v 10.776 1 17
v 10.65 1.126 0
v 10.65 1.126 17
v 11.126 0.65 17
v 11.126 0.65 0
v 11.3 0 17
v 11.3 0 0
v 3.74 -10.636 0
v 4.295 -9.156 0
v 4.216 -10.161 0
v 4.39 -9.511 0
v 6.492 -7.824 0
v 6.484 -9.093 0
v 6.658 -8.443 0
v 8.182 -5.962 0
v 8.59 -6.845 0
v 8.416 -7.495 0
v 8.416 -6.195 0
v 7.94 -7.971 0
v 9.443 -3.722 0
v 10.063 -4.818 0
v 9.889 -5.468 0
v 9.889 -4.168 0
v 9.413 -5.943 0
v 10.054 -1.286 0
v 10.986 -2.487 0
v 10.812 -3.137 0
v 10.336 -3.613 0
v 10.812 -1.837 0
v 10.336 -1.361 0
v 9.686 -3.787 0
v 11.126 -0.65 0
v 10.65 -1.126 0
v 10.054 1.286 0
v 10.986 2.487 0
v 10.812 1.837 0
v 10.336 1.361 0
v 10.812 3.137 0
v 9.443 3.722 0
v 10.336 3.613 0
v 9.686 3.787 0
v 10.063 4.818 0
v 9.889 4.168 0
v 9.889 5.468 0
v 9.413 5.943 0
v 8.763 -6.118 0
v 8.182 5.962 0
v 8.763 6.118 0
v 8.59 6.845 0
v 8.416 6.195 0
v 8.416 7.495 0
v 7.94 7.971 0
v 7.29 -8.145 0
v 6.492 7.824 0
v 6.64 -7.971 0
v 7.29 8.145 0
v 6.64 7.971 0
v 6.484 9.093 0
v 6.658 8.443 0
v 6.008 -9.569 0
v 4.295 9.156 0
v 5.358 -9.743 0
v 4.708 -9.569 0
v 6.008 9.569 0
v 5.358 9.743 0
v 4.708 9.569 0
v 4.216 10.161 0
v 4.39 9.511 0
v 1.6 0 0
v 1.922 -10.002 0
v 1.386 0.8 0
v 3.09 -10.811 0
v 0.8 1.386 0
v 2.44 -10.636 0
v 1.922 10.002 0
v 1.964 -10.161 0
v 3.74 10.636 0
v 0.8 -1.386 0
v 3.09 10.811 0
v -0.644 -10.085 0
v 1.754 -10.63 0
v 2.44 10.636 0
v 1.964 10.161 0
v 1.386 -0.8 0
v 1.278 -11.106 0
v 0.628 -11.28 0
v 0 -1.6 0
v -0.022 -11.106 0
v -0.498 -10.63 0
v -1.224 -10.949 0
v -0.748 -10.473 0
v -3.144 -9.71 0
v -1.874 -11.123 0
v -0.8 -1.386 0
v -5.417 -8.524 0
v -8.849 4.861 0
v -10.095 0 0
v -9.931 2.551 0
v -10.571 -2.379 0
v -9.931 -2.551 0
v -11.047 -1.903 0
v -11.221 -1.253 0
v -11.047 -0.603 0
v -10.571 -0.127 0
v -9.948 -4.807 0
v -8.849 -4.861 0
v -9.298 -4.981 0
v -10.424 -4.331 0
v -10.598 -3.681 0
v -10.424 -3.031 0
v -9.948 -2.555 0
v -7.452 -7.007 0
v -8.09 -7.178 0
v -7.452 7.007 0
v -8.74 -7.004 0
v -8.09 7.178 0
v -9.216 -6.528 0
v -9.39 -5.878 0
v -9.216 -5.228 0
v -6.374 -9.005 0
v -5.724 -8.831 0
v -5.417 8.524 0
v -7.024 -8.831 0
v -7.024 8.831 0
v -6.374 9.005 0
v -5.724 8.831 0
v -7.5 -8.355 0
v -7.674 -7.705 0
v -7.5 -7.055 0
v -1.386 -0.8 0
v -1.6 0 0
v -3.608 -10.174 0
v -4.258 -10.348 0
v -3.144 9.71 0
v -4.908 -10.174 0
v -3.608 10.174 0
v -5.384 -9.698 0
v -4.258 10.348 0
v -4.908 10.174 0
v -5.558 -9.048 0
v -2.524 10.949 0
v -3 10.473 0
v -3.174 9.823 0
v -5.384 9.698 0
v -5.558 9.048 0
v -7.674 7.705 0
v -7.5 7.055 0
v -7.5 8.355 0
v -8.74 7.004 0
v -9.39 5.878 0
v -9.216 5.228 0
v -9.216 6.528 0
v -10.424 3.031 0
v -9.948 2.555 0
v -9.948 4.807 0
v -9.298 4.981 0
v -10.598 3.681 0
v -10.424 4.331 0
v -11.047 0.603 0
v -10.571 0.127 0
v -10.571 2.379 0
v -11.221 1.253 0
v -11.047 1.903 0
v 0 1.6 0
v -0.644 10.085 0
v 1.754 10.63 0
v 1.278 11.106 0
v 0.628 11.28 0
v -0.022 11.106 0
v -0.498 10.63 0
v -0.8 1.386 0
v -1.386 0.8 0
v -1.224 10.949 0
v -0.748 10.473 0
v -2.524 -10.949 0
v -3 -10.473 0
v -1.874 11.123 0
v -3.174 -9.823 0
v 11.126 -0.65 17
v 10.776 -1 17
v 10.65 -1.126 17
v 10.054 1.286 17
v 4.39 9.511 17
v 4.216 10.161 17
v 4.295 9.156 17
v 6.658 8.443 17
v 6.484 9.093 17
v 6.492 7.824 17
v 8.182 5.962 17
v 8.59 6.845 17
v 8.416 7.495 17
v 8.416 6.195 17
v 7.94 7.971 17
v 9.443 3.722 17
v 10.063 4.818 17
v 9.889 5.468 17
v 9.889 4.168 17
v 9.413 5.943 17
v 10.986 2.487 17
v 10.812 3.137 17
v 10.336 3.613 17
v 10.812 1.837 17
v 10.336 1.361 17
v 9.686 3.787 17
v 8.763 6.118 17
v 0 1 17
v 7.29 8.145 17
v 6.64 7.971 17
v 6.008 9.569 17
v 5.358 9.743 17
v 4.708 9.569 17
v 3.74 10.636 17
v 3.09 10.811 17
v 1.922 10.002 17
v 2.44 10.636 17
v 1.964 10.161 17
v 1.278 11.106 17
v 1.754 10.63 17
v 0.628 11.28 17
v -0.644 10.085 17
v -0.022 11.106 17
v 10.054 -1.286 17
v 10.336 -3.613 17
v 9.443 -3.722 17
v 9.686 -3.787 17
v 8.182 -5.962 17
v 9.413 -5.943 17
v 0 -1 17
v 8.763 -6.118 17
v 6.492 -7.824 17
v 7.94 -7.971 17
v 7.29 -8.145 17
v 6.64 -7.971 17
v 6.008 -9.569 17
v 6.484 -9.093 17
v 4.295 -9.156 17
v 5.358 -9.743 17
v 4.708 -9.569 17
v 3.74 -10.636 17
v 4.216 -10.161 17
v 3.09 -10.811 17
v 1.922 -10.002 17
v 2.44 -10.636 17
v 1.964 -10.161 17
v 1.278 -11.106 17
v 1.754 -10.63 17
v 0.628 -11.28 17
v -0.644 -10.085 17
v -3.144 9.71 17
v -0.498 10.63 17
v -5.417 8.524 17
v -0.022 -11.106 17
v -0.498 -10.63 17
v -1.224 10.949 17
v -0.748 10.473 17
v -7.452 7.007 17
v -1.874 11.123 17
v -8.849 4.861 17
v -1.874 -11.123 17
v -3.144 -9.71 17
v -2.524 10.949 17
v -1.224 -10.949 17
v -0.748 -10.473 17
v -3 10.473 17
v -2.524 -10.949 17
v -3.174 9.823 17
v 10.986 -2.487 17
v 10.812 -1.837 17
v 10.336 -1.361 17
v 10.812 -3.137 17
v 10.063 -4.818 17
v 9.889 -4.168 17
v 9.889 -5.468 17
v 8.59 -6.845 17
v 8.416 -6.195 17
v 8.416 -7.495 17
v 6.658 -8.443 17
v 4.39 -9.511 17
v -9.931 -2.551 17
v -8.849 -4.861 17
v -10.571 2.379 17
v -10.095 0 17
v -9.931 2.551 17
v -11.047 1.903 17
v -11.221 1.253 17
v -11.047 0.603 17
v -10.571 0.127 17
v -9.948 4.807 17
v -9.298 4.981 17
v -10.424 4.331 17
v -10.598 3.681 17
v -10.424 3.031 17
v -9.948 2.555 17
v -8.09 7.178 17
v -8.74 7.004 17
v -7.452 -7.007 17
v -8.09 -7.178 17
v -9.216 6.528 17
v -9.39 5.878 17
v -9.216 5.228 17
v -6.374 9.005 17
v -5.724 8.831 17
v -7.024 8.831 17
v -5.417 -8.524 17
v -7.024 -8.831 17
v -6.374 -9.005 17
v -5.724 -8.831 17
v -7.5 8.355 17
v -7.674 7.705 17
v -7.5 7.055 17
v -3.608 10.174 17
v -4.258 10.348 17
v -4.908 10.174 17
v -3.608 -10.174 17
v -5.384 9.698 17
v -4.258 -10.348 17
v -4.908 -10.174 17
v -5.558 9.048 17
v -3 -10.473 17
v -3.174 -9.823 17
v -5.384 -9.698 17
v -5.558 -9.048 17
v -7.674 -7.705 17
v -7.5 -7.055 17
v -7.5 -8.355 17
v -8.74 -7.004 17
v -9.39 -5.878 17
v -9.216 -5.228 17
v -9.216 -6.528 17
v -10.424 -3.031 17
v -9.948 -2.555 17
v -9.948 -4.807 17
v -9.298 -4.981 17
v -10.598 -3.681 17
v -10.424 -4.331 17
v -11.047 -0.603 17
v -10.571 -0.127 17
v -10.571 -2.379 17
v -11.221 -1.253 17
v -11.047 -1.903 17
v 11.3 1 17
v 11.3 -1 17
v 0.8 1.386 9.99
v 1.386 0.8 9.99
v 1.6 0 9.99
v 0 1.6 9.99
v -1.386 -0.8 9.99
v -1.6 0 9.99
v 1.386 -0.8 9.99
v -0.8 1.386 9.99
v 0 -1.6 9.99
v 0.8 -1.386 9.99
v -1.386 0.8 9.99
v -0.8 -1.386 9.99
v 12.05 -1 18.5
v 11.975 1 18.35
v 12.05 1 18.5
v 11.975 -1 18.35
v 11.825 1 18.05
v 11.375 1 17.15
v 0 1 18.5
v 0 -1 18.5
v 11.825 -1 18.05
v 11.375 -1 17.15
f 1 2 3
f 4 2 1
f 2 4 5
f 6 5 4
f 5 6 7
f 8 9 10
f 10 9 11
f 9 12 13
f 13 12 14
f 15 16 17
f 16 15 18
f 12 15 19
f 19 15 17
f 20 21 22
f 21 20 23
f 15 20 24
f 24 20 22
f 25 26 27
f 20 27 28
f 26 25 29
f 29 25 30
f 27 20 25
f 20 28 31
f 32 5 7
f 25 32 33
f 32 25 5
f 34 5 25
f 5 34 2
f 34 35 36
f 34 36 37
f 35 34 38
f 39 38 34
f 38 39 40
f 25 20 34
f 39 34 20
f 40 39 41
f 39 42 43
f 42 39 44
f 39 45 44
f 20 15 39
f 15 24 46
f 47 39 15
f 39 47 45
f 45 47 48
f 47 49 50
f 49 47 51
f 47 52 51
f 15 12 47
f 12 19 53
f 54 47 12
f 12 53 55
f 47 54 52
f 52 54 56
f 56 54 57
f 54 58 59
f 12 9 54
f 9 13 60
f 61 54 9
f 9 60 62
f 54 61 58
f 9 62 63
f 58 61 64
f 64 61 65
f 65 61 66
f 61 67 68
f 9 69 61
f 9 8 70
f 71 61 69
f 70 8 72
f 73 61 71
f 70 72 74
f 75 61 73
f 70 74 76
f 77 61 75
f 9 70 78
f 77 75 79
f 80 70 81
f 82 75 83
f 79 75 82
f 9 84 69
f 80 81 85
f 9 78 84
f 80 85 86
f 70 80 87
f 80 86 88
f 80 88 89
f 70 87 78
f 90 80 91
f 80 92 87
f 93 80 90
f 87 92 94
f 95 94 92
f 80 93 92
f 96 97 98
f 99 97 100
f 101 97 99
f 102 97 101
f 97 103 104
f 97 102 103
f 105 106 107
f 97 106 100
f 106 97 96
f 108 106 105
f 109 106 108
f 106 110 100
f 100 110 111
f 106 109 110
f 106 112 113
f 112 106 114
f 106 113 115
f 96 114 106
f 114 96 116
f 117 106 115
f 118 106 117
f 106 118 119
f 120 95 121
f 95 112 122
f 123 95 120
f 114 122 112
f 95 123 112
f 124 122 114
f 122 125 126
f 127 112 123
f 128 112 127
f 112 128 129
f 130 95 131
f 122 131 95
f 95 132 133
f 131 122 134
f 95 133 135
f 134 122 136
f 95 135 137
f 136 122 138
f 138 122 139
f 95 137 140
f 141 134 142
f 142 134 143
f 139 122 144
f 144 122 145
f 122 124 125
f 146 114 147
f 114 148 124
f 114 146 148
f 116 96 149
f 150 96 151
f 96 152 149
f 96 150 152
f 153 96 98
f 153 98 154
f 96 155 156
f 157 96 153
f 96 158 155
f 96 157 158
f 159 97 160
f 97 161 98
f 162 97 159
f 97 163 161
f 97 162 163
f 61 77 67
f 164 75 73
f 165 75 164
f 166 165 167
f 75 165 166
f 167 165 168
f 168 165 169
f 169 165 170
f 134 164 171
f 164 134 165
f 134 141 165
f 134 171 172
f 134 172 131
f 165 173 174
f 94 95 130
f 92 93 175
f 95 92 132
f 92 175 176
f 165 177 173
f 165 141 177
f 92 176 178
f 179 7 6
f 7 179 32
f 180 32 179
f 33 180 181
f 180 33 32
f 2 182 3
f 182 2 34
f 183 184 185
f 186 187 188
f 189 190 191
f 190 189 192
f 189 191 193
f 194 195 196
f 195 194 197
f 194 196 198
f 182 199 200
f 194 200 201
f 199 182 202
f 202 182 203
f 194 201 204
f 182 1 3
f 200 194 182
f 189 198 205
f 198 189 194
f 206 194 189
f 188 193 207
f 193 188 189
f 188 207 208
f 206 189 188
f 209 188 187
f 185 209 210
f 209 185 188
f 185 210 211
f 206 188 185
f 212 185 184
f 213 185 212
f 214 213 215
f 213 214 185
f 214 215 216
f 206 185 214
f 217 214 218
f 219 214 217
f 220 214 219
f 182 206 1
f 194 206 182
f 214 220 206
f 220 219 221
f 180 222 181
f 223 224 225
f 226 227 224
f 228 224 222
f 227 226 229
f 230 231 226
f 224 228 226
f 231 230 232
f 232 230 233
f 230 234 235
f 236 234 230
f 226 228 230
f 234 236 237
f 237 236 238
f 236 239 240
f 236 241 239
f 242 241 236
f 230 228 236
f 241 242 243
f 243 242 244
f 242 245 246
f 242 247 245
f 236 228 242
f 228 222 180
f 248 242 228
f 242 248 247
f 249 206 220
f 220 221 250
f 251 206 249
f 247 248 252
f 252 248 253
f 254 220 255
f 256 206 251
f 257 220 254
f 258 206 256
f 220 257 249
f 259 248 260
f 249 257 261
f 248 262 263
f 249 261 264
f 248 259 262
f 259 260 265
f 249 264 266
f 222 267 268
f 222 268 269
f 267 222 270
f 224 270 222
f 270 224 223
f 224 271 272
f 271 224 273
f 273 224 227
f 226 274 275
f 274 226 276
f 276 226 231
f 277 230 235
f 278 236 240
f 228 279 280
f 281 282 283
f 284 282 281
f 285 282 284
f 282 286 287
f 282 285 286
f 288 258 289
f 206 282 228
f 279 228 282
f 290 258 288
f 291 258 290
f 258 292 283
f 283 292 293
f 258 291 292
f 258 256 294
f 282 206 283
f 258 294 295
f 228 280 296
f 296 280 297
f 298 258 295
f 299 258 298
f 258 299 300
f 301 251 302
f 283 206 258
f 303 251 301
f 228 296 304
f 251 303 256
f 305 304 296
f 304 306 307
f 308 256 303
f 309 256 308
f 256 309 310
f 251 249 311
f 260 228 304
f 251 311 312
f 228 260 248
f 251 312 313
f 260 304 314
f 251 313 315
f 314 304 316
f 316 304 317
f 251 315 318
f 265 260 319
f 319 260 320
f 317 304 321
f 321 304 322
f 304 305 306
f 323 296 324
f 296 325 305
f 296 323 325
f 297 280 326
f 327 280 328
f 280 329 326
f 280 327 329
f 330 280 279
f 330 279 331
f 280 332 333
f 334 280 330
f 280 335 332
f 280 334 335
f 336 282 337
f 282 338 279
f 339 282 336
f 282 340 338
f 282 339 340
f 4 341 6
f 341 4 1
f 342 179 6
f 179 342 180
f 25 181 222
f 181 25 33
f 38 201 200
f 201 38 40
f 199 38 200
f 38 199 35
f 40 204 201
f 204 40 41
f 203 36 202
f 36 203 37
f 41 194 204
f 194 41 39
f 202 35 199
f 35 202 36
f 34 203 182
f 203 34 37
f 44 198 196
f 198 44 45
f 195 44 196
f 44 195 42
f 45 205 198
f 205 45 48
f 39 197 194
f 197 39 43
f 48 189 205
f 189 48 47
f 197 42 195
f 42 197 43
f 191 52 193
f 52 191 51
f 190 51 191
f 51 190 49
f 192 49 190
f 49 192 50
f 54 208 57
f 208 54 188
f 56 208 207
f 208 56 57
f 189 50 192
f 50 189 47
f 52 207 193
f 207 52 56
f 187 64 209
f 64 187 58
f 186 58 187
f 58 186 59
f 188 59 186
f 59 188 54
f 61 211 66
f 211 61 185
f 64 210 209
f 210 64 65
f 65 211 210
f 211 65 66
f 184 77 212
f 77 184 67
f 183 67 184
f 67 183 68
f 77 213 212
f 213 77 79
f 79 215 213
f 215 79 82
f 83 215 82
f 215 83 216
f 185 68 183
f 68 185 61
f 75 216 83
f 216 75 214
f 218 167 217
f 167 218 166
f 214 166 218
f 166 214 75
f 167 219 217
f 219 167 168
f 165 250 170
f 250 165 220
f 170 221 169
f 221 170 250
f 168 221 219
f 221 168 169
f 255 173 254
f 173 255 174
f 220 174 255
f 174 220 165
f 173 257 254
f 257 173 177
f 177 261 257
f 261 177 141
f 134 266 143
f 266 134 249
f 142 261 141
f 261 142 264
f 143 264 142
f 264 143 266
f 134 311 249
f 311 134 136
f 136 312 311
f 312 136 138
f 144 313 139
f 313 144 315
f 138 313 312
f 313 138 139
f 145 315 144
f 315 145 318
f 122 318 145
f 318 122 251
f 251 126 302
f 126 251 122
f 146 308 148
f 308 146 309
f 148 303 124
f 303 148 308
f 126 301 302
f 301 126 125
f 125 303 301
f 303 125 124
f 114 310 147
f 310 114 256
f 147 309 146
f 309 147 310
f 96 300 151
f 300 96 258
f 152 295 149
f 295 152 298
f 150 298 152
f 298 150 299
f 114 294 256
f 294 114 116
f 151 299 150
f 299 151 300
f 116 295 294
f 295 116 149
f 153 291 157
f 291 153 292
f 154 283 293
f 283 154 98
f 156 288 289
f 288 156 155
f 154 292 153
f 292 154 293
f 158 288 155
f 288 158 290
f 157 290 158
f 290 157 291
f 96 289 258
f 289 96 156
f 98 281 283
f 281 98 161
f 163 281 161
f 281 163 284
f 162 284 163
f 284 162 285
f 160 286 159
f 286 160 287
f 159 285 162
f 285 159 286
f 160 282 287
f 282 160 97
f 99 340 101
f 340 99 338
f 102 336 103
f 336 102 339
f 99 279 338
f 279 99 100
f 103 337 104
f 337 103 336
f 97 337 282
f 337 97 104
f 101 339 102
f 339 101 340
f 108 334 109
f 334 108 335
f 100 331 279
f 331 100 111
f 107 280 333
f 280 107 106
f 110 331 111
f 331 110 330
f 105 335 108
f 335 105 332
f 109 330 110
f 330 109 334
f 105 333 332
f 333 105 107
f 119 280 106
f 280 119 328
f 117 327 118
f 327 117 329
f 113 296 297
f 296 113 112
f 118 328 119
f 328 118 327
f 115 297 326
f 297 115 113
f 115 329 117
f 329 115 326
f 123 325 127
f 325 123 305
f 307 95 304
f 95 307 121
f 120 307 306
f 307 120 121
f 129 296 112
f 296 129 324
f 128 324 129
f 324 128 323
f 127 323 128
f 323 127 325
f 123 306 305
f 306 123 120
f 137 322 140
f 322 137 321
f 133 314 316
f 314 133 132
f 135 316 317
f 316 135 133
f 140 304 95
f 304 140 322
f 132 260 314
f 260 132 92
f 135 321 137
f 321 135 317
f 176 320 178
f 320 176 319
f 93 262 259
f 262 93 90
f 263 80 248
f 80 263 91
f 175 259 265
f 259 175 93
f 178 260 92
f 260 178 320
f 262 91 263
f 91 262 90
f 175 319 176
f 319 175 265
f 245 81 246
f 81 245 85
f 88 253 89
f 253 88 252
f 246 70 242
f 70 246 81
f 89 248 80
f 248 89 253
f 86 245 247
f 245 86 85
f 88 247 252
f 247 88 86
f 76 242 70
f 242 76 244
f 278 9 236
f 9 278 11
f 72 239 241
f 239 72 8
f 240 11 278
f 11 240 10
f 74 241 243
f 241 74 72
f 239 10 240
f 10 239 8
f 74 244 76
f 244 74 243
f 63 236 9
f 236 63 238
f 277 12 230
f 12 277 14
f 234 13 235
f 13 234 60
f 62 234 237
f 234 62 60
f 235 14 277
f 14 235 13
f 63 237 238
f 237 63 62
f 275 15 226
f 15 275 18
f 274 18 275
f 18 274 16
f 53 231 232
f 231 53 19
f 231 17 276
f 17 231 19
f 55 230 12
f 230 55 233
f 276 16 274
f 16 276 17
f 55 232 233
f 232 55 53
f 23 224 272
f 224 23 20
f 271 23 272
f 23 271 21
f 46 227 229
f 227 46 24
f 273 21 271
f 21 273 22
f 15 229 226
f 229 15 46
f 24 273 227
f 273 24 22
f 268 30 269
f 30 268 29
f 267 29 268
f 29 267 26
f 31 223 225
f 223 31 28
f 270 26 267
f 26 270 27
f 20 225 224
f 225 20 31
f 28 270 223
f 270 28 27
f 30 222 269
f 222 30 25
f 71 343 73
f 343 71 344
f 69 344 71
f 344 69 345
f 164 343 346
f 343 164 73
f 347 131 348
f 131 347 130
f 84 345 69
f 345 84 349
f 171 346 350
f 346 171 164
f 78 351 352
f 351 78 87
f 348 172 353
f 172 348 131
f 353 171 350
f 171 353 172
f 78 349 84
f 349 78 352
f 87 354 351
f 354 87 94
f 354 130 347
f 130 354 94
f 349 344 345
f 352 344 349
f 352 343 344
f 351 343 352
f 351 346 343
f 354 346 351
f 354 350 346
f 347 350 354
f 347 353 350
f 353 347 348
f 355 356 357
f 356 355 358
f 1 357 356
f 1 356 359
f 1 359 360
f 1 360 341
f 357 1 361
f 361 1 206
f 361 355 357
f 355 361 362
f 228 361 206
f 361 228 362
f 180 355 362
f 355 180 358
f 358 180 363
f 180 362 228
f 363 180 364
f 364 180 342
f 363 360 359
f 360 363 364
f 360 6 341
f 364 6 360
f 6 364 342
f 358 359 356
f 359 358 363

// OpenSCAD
//use <tubemesh.scad>;
// params = [sections,sectionCounts]

// written for tail-recursion
// _subtotals[i] = list[0] + ... + list[i-1]
function _subtotals(list,soFar=[]) =
        len(soFar) >= 1+len(list) ? soFar :
        _subtotals(list,
            let(n1=len(soFar))
            concat(soFar, n1>0 ? soFar[n1-1]+list[n1-1] : 0));

function _flatten(list) = [for (a=list) for(b=a) b];

function _reverseTriangle(t) = [t[2], t[1], t[0]];

// smallest angle in triangle
function _minAngle(p1,p2,p3) =
    let(a = p2-p1,
        b = p3-p1,
        c = p3-p2,
        v1 = a*b,
        v2 = -(c*a))
        v1 == 0 || v2 == 0 ? 0 :
        let( na = norm(a),
             a1 = acos(v1 / (na*norm(b))),
             a2 = acos(v2 / (na*norm(c))) )
        min(a1,a2,180-(a1+a2));

// triangulate square to maximize smallest angle
function _doSquare(points,i11,i21,i22,i12,optimize=true) =
    points[i11]==points[i12] ? [[i11,i21,i22]] :
    points[i21]==points[i22] ? [[i22,i12,i11]] :
    !optimize ? [[i11,i21,i22], [i22,i12,i11]] :
    let (m1 = min(_minAngle(points[i11],points[i21],points[i22]), _minAngle(points[i22],points[i12],points[i11])),
        m2 = min(_minAngle(points[i11],points[i21],points[i12]),
                _minAngle(points[i21],points[i22],points[i12])) )
        m2 <= m1 ? [[i11,i21,i22], [i22,i12,i11]] :
                  [[i11,i21,i12], [i21,i22,i12]];

/*
function _inTriangle(v1,t) = (v1==t[0] || v1==t[1] || v1==t[2]);

function _findTheDistinctVertex(t1,t2) =
    let(in = [for(i=[0:2]) _inTriangle(t1[i],t2)])
    ! in[0] && in[1] && in[2] ? 0 :
    ! in[1] && in[0] && in[2] ? 1 :
    ! in[2] && in[0] && in[1] ? 2 :
    undef;

// make vertex i come first
function _rotateTriangle(t,i) =
    [for (j=[0:2]) t[(j+i)%3]];

function _optimize2Triangles(points,t1,t2) =
    let(i1 = _findTheDistinctVertex(t1,t2))
    i1 == undef ? [t1,t2] :
    let(i2 = _findTheDistinctVertex(t2,t1))
    i2 == undef ? [t1,t2] :
    let(t1 = _rotateTriangle(t1,i1),
        t2 = _rotateTriangle(t2,i2))
    _doSquare(points,t1[1],t2[0],t2[1],t1[0],optimize=true);

// a greedy optimization for a strip of triangles most of which adjoin one another; written for tail-recursion
function _optimizeTriangles(points,triangles,position=0,optimize=true,iterations=4) =
        !optimize || position >= iterations*len(triangles) ? triangles :
            _optimizeTriangles(points,
                let(
                    n = len(triangles),
                    position1=position%n,
                    position2=(position+1)%n,
                    opt=_optimize2Triangles(points,triangles[position1],triangles[position2]))
                    [for (i=[0:len(triangles)-1])
                        i == position1 ? opt[0] :
                        i == position2 ? opt[1] :
                            triangles[i]],
                position=position+1);
*/

function _removeEmptyTriangles(points,triangles) =
    [for(t=triangles)
        if(true || points[t[0]] != points[t[1]] && points[t[1]] != points[t[2]] && points[t[2]] != points[t[0]]) t];

// n1 and n2 should be fairly small, so this doesn't need
// tail-recursion
// this assumes n1<=n2
function _tubeSegmentTriangles(points,index1,n1,index2,n2,i=0,soFar=[],optimize=true)
    = i>=n2 ? _removeEmptyTriangles(points,soFar) :
            let(i21=i,
                i22=(i+1)%n2,
                i11=floor((i21)*n1/n2+0.5)%n1,
                i12=floor((i22)*n1/n2+0.5)%n1,
                add = i11==i12 ? [[index1+i11,index2+i21,index2+i22]] :
                    _doSquare(points,index1+i11,index2+i21,index2+i22,index1+i12,optimize=optimize))
                _tubeSegmentTriangles(points,index1,n1,index2,n2,i=i+1,soFar=concat(soFar,add),optimize=optimize);

function _tubeSegmentFaces(points,index,n1,n2,optimize=true)
    = n1<n2 ? _tubeSegmentTriangles(points,index,n1,index+n1,n2,optimize=optimize) :
        [for (f=_tubeSegmentTriangles(points,index+n1,n2,index,n1,optimize=optimize)) _reverseTriangle(f)];

function _tubeMiddleFaces(points,counts,subtotals,optimize=true) = [ for (i=[1:len(counts)-1])
           for (face=_tubeSegmentFaces(points,subtotals[i-1],counts[i-1],counts[i],optimize=optimize)) face ];

function _endCaps(counts,subtotals,startCap=true,endCap=true) =
    let( n = len(counts),
         cap1 = counts[0]<=2 || !startCap ? undef : [for(i=[0:counts[0]-1]) i],
         cap2 = counts[n-1]<=2 || !endCap ? undef : [for(i=[counts[n-1]-1:-1:0]) subtotals[n-1]+i] )
       [for (c=[cap1,cap2]) if (c!=undef) c];

function _tubeFaces(sections,startCap=true,endCap=true,optimize=true) =
                let(
        counts = [for (s=sections) len(s)],
        points = _flatten(sections),
        subtotals = _subtotals(counts))
            concat(_tubeMiddleFaces(points,counts,subtotals,optimize=optimize),_endCaps(counts,subtotals,startCap=true,endCap=true));

function _removeDuplicates1(points,soFar=[[],[]]) =
        len(soFar[0]) >= len(points) ? soFar :
            _removeDuplicates1(points,
               let(
                mapSoFar=soFar[0],
                pointsSoFar=soFar[1],
                j=len(mapSoFar),
                k=search([points[j]], pointsSoFar)[0])
                k == []? [concat(mapSoFar,[len(pointsSoFar)]),
                            concat(pointsSoFar,[points[j]])] :
                           [concat(mapSoFar,[k]),pointsSoFar]);

function _removeDuplicates(points, faces) =
    let(fix=_removeDuplicates1(points),
        map=fix[0],
        newPoints=fix[1],
        newFaces=[for(f=faces) [for(v=f) map[v]]])
            [newPoints, newFaces];

function pointsAndFaces(sections,startCap=true,endCap=true,optimize=true) =
        let(
            points0=_flatten(sections),
            faces0=_tubeFaces(sections,startCap=startCap,endCap=endCap,optimize=optimize))
        _removeDuplicates(points0,faces0);

module tubeMesh(sections,startCap=true,endCap=true,optimize=true) {
    pAndF = pointsAndFaces(sections,startCap=startCap,endCap=endCap,optimize=optimize);
    polyhedron(points=pAndF[0],faces=pAndF[1]);
}

// increase number of points from len(section) to n
function _interpolateSection(section,n) =
        let(m=len(section))
        n == m ? section :
        n < m ? undef :
            [for(i=[0:m-1])
                let(cur=floor(i*n/m),
                    k=floor((i+1)*n/m)-cur,
                    i2=(i+1)%m)
                    for(j=[0:k-1])
                        let(t=j/k)
                            section[i]*(1-t)+section[i2]*t];

function ngonPoints(n=4,r=10,d=undef,rotate=0,z=undef) =
            let(r=d==undef?r:d/2)
            z==undef ?
            r*[for(i=[0:n-1]) let(angle=i*360/n+rotate) [cos(angle),sin(angle)]] :
            [for(i=[0:n-1]) let(angle=i*360/n+rotate) [r*cos(angle),r*sin(angle),z]];

function starPoints(n=10,r1=5,r2=10,rotate=0,z=undef) =
          z==undef ?
            [for(i=[0:2*n-1]) let(angle=i*180/n+rotate) (i%2?r1:r2) * [cos(angle),sin(angle)]] :
            [for(i=[0:2*n-1]) let(angle=i*180/n+rotate, r=i%2?r1:r2) [r*cos(angle),r*sin(angle),z]];

// warning: no guarantee of perfect convexity
module mySphere(r=10,d=undef) {
    GA = 2.39996322972865332 * 180 / PI;
    radius = d==undef ? r : d/2;
    pointsAround =
        $fn ? $fn :
        max(3, floor(0.5+360/$fa), floor(0.5+2*radius*PI/$fs));
    numSlices0 = (pointsAround + pointsAround % 2)/2;
    numSlices = numSlices0 + (numSlices0%2);
    sections = radius*[for(i=[0:numSlices])
                    i == 0 ? [[0,0,-1]] :
                    i == numSlices ? [[0,0,1]] :
                    let(
                        lat = (i-numSlices/2)/(numSlices/2)*90,
                        z1 = sin(lat),
                        r1 = cos(lat),
                        count = max(3,floor(0.5 + pointsAround * abs(r1))))
                        ngonPoints(count,r=r1,z=z1)];
    data = pointsAndFaces(sections,optimize=false);
    polyhedron(points=data[0], faces=data[1]);
}

module morphExtrude(section1,section2,height=undef,twist=0,numSlices=10,startCap=true,endCap=true,optimize=false) {
    n = max(len(section1),len(section2));

    section1interp = _interpolateSection(section1,n);
    section2interp = _interpolateSection(section2,n);
    sections = height == undef ?
                      [for(i=[0:numSlices])
                        let(t=i/numSlices)
                        (1-t)*section1interp+t*section2interp] :
                      [for(i=[0:numSlices])
                        let(t=i/numSlices,
                            theta = t*twist,
                            section=(1-t)*section1interp+t*section2interp)
                        [for(p=section) [p[0]*cos(theta)-p[1]*sin(theta),p[0]*sin(theta)+p[1]*cos(theta),height*t]]];

    tubeMesh(sections,startCap=startCap,endCap=endCap,optimize=false);
}

module cone(r=10,d=undef,height=10) {
    radius = d==undef ? r : d/2;
    pointsAround =
        $fn ? $fn :
        max(3, floor(0.5+360/$fa), floor(0.5+2*radius*PI/$fs));
    morphExtrude(ngonPoints(n=pointsAround,r=radius), [[0,0]], height=height,optimize=false);
}

module prism(base=[[0,0,0],[1,0,0],[0,1,0]], vertical=[0,0,1]) {
    morphExtrude(base,[for(v=base) v+vertical],numSlices=1);
}


d = 20;
h = 17;
lineHeight = 1.5;
lineThickness = 2;
holeDiameter = 3.2;
holeHeight = 10;
stickoutRatio = 0.5;
knurl = 1.3;

module knurledCylinder(h=10,r1=5,r2=1.5) {
    n = ceil(2 * PI * r1 / (2 * r2));
    cylinder(h=h,r=r1,$fn=n);
    for (i=[0:n-1]) {
        x = r1*cos(360./n*i);
        y = r1*sin(360./n*i);
        translate([x,y,0]) cylinder(h=h,r=r2,$fn=12);
    }
}

render(convexity=3)
difference() {
knurledCylinder(h=h,r1=d/2,r2=knurl);
translate([0,0,-0.01]) cylinder(h=holeHeight,d=holeDiameter,$fn=12);
}

translate([0,0,h])
morphExtrude([[0,-lineThickness/2],[d/2+knurl,-lineThickness/2],[d/2+knurl,lineThickness/2],[0,lineThickness/2]],
    [[0,-lineThickness/2],[d/2+knurl+lineHeight*stickoutRatio,-lineThickness/2],[d/2+knurl+lineHeight*stickoutRatio,lineThickness/2],[0,lineThickness/2]],
    height=lineHeight);
